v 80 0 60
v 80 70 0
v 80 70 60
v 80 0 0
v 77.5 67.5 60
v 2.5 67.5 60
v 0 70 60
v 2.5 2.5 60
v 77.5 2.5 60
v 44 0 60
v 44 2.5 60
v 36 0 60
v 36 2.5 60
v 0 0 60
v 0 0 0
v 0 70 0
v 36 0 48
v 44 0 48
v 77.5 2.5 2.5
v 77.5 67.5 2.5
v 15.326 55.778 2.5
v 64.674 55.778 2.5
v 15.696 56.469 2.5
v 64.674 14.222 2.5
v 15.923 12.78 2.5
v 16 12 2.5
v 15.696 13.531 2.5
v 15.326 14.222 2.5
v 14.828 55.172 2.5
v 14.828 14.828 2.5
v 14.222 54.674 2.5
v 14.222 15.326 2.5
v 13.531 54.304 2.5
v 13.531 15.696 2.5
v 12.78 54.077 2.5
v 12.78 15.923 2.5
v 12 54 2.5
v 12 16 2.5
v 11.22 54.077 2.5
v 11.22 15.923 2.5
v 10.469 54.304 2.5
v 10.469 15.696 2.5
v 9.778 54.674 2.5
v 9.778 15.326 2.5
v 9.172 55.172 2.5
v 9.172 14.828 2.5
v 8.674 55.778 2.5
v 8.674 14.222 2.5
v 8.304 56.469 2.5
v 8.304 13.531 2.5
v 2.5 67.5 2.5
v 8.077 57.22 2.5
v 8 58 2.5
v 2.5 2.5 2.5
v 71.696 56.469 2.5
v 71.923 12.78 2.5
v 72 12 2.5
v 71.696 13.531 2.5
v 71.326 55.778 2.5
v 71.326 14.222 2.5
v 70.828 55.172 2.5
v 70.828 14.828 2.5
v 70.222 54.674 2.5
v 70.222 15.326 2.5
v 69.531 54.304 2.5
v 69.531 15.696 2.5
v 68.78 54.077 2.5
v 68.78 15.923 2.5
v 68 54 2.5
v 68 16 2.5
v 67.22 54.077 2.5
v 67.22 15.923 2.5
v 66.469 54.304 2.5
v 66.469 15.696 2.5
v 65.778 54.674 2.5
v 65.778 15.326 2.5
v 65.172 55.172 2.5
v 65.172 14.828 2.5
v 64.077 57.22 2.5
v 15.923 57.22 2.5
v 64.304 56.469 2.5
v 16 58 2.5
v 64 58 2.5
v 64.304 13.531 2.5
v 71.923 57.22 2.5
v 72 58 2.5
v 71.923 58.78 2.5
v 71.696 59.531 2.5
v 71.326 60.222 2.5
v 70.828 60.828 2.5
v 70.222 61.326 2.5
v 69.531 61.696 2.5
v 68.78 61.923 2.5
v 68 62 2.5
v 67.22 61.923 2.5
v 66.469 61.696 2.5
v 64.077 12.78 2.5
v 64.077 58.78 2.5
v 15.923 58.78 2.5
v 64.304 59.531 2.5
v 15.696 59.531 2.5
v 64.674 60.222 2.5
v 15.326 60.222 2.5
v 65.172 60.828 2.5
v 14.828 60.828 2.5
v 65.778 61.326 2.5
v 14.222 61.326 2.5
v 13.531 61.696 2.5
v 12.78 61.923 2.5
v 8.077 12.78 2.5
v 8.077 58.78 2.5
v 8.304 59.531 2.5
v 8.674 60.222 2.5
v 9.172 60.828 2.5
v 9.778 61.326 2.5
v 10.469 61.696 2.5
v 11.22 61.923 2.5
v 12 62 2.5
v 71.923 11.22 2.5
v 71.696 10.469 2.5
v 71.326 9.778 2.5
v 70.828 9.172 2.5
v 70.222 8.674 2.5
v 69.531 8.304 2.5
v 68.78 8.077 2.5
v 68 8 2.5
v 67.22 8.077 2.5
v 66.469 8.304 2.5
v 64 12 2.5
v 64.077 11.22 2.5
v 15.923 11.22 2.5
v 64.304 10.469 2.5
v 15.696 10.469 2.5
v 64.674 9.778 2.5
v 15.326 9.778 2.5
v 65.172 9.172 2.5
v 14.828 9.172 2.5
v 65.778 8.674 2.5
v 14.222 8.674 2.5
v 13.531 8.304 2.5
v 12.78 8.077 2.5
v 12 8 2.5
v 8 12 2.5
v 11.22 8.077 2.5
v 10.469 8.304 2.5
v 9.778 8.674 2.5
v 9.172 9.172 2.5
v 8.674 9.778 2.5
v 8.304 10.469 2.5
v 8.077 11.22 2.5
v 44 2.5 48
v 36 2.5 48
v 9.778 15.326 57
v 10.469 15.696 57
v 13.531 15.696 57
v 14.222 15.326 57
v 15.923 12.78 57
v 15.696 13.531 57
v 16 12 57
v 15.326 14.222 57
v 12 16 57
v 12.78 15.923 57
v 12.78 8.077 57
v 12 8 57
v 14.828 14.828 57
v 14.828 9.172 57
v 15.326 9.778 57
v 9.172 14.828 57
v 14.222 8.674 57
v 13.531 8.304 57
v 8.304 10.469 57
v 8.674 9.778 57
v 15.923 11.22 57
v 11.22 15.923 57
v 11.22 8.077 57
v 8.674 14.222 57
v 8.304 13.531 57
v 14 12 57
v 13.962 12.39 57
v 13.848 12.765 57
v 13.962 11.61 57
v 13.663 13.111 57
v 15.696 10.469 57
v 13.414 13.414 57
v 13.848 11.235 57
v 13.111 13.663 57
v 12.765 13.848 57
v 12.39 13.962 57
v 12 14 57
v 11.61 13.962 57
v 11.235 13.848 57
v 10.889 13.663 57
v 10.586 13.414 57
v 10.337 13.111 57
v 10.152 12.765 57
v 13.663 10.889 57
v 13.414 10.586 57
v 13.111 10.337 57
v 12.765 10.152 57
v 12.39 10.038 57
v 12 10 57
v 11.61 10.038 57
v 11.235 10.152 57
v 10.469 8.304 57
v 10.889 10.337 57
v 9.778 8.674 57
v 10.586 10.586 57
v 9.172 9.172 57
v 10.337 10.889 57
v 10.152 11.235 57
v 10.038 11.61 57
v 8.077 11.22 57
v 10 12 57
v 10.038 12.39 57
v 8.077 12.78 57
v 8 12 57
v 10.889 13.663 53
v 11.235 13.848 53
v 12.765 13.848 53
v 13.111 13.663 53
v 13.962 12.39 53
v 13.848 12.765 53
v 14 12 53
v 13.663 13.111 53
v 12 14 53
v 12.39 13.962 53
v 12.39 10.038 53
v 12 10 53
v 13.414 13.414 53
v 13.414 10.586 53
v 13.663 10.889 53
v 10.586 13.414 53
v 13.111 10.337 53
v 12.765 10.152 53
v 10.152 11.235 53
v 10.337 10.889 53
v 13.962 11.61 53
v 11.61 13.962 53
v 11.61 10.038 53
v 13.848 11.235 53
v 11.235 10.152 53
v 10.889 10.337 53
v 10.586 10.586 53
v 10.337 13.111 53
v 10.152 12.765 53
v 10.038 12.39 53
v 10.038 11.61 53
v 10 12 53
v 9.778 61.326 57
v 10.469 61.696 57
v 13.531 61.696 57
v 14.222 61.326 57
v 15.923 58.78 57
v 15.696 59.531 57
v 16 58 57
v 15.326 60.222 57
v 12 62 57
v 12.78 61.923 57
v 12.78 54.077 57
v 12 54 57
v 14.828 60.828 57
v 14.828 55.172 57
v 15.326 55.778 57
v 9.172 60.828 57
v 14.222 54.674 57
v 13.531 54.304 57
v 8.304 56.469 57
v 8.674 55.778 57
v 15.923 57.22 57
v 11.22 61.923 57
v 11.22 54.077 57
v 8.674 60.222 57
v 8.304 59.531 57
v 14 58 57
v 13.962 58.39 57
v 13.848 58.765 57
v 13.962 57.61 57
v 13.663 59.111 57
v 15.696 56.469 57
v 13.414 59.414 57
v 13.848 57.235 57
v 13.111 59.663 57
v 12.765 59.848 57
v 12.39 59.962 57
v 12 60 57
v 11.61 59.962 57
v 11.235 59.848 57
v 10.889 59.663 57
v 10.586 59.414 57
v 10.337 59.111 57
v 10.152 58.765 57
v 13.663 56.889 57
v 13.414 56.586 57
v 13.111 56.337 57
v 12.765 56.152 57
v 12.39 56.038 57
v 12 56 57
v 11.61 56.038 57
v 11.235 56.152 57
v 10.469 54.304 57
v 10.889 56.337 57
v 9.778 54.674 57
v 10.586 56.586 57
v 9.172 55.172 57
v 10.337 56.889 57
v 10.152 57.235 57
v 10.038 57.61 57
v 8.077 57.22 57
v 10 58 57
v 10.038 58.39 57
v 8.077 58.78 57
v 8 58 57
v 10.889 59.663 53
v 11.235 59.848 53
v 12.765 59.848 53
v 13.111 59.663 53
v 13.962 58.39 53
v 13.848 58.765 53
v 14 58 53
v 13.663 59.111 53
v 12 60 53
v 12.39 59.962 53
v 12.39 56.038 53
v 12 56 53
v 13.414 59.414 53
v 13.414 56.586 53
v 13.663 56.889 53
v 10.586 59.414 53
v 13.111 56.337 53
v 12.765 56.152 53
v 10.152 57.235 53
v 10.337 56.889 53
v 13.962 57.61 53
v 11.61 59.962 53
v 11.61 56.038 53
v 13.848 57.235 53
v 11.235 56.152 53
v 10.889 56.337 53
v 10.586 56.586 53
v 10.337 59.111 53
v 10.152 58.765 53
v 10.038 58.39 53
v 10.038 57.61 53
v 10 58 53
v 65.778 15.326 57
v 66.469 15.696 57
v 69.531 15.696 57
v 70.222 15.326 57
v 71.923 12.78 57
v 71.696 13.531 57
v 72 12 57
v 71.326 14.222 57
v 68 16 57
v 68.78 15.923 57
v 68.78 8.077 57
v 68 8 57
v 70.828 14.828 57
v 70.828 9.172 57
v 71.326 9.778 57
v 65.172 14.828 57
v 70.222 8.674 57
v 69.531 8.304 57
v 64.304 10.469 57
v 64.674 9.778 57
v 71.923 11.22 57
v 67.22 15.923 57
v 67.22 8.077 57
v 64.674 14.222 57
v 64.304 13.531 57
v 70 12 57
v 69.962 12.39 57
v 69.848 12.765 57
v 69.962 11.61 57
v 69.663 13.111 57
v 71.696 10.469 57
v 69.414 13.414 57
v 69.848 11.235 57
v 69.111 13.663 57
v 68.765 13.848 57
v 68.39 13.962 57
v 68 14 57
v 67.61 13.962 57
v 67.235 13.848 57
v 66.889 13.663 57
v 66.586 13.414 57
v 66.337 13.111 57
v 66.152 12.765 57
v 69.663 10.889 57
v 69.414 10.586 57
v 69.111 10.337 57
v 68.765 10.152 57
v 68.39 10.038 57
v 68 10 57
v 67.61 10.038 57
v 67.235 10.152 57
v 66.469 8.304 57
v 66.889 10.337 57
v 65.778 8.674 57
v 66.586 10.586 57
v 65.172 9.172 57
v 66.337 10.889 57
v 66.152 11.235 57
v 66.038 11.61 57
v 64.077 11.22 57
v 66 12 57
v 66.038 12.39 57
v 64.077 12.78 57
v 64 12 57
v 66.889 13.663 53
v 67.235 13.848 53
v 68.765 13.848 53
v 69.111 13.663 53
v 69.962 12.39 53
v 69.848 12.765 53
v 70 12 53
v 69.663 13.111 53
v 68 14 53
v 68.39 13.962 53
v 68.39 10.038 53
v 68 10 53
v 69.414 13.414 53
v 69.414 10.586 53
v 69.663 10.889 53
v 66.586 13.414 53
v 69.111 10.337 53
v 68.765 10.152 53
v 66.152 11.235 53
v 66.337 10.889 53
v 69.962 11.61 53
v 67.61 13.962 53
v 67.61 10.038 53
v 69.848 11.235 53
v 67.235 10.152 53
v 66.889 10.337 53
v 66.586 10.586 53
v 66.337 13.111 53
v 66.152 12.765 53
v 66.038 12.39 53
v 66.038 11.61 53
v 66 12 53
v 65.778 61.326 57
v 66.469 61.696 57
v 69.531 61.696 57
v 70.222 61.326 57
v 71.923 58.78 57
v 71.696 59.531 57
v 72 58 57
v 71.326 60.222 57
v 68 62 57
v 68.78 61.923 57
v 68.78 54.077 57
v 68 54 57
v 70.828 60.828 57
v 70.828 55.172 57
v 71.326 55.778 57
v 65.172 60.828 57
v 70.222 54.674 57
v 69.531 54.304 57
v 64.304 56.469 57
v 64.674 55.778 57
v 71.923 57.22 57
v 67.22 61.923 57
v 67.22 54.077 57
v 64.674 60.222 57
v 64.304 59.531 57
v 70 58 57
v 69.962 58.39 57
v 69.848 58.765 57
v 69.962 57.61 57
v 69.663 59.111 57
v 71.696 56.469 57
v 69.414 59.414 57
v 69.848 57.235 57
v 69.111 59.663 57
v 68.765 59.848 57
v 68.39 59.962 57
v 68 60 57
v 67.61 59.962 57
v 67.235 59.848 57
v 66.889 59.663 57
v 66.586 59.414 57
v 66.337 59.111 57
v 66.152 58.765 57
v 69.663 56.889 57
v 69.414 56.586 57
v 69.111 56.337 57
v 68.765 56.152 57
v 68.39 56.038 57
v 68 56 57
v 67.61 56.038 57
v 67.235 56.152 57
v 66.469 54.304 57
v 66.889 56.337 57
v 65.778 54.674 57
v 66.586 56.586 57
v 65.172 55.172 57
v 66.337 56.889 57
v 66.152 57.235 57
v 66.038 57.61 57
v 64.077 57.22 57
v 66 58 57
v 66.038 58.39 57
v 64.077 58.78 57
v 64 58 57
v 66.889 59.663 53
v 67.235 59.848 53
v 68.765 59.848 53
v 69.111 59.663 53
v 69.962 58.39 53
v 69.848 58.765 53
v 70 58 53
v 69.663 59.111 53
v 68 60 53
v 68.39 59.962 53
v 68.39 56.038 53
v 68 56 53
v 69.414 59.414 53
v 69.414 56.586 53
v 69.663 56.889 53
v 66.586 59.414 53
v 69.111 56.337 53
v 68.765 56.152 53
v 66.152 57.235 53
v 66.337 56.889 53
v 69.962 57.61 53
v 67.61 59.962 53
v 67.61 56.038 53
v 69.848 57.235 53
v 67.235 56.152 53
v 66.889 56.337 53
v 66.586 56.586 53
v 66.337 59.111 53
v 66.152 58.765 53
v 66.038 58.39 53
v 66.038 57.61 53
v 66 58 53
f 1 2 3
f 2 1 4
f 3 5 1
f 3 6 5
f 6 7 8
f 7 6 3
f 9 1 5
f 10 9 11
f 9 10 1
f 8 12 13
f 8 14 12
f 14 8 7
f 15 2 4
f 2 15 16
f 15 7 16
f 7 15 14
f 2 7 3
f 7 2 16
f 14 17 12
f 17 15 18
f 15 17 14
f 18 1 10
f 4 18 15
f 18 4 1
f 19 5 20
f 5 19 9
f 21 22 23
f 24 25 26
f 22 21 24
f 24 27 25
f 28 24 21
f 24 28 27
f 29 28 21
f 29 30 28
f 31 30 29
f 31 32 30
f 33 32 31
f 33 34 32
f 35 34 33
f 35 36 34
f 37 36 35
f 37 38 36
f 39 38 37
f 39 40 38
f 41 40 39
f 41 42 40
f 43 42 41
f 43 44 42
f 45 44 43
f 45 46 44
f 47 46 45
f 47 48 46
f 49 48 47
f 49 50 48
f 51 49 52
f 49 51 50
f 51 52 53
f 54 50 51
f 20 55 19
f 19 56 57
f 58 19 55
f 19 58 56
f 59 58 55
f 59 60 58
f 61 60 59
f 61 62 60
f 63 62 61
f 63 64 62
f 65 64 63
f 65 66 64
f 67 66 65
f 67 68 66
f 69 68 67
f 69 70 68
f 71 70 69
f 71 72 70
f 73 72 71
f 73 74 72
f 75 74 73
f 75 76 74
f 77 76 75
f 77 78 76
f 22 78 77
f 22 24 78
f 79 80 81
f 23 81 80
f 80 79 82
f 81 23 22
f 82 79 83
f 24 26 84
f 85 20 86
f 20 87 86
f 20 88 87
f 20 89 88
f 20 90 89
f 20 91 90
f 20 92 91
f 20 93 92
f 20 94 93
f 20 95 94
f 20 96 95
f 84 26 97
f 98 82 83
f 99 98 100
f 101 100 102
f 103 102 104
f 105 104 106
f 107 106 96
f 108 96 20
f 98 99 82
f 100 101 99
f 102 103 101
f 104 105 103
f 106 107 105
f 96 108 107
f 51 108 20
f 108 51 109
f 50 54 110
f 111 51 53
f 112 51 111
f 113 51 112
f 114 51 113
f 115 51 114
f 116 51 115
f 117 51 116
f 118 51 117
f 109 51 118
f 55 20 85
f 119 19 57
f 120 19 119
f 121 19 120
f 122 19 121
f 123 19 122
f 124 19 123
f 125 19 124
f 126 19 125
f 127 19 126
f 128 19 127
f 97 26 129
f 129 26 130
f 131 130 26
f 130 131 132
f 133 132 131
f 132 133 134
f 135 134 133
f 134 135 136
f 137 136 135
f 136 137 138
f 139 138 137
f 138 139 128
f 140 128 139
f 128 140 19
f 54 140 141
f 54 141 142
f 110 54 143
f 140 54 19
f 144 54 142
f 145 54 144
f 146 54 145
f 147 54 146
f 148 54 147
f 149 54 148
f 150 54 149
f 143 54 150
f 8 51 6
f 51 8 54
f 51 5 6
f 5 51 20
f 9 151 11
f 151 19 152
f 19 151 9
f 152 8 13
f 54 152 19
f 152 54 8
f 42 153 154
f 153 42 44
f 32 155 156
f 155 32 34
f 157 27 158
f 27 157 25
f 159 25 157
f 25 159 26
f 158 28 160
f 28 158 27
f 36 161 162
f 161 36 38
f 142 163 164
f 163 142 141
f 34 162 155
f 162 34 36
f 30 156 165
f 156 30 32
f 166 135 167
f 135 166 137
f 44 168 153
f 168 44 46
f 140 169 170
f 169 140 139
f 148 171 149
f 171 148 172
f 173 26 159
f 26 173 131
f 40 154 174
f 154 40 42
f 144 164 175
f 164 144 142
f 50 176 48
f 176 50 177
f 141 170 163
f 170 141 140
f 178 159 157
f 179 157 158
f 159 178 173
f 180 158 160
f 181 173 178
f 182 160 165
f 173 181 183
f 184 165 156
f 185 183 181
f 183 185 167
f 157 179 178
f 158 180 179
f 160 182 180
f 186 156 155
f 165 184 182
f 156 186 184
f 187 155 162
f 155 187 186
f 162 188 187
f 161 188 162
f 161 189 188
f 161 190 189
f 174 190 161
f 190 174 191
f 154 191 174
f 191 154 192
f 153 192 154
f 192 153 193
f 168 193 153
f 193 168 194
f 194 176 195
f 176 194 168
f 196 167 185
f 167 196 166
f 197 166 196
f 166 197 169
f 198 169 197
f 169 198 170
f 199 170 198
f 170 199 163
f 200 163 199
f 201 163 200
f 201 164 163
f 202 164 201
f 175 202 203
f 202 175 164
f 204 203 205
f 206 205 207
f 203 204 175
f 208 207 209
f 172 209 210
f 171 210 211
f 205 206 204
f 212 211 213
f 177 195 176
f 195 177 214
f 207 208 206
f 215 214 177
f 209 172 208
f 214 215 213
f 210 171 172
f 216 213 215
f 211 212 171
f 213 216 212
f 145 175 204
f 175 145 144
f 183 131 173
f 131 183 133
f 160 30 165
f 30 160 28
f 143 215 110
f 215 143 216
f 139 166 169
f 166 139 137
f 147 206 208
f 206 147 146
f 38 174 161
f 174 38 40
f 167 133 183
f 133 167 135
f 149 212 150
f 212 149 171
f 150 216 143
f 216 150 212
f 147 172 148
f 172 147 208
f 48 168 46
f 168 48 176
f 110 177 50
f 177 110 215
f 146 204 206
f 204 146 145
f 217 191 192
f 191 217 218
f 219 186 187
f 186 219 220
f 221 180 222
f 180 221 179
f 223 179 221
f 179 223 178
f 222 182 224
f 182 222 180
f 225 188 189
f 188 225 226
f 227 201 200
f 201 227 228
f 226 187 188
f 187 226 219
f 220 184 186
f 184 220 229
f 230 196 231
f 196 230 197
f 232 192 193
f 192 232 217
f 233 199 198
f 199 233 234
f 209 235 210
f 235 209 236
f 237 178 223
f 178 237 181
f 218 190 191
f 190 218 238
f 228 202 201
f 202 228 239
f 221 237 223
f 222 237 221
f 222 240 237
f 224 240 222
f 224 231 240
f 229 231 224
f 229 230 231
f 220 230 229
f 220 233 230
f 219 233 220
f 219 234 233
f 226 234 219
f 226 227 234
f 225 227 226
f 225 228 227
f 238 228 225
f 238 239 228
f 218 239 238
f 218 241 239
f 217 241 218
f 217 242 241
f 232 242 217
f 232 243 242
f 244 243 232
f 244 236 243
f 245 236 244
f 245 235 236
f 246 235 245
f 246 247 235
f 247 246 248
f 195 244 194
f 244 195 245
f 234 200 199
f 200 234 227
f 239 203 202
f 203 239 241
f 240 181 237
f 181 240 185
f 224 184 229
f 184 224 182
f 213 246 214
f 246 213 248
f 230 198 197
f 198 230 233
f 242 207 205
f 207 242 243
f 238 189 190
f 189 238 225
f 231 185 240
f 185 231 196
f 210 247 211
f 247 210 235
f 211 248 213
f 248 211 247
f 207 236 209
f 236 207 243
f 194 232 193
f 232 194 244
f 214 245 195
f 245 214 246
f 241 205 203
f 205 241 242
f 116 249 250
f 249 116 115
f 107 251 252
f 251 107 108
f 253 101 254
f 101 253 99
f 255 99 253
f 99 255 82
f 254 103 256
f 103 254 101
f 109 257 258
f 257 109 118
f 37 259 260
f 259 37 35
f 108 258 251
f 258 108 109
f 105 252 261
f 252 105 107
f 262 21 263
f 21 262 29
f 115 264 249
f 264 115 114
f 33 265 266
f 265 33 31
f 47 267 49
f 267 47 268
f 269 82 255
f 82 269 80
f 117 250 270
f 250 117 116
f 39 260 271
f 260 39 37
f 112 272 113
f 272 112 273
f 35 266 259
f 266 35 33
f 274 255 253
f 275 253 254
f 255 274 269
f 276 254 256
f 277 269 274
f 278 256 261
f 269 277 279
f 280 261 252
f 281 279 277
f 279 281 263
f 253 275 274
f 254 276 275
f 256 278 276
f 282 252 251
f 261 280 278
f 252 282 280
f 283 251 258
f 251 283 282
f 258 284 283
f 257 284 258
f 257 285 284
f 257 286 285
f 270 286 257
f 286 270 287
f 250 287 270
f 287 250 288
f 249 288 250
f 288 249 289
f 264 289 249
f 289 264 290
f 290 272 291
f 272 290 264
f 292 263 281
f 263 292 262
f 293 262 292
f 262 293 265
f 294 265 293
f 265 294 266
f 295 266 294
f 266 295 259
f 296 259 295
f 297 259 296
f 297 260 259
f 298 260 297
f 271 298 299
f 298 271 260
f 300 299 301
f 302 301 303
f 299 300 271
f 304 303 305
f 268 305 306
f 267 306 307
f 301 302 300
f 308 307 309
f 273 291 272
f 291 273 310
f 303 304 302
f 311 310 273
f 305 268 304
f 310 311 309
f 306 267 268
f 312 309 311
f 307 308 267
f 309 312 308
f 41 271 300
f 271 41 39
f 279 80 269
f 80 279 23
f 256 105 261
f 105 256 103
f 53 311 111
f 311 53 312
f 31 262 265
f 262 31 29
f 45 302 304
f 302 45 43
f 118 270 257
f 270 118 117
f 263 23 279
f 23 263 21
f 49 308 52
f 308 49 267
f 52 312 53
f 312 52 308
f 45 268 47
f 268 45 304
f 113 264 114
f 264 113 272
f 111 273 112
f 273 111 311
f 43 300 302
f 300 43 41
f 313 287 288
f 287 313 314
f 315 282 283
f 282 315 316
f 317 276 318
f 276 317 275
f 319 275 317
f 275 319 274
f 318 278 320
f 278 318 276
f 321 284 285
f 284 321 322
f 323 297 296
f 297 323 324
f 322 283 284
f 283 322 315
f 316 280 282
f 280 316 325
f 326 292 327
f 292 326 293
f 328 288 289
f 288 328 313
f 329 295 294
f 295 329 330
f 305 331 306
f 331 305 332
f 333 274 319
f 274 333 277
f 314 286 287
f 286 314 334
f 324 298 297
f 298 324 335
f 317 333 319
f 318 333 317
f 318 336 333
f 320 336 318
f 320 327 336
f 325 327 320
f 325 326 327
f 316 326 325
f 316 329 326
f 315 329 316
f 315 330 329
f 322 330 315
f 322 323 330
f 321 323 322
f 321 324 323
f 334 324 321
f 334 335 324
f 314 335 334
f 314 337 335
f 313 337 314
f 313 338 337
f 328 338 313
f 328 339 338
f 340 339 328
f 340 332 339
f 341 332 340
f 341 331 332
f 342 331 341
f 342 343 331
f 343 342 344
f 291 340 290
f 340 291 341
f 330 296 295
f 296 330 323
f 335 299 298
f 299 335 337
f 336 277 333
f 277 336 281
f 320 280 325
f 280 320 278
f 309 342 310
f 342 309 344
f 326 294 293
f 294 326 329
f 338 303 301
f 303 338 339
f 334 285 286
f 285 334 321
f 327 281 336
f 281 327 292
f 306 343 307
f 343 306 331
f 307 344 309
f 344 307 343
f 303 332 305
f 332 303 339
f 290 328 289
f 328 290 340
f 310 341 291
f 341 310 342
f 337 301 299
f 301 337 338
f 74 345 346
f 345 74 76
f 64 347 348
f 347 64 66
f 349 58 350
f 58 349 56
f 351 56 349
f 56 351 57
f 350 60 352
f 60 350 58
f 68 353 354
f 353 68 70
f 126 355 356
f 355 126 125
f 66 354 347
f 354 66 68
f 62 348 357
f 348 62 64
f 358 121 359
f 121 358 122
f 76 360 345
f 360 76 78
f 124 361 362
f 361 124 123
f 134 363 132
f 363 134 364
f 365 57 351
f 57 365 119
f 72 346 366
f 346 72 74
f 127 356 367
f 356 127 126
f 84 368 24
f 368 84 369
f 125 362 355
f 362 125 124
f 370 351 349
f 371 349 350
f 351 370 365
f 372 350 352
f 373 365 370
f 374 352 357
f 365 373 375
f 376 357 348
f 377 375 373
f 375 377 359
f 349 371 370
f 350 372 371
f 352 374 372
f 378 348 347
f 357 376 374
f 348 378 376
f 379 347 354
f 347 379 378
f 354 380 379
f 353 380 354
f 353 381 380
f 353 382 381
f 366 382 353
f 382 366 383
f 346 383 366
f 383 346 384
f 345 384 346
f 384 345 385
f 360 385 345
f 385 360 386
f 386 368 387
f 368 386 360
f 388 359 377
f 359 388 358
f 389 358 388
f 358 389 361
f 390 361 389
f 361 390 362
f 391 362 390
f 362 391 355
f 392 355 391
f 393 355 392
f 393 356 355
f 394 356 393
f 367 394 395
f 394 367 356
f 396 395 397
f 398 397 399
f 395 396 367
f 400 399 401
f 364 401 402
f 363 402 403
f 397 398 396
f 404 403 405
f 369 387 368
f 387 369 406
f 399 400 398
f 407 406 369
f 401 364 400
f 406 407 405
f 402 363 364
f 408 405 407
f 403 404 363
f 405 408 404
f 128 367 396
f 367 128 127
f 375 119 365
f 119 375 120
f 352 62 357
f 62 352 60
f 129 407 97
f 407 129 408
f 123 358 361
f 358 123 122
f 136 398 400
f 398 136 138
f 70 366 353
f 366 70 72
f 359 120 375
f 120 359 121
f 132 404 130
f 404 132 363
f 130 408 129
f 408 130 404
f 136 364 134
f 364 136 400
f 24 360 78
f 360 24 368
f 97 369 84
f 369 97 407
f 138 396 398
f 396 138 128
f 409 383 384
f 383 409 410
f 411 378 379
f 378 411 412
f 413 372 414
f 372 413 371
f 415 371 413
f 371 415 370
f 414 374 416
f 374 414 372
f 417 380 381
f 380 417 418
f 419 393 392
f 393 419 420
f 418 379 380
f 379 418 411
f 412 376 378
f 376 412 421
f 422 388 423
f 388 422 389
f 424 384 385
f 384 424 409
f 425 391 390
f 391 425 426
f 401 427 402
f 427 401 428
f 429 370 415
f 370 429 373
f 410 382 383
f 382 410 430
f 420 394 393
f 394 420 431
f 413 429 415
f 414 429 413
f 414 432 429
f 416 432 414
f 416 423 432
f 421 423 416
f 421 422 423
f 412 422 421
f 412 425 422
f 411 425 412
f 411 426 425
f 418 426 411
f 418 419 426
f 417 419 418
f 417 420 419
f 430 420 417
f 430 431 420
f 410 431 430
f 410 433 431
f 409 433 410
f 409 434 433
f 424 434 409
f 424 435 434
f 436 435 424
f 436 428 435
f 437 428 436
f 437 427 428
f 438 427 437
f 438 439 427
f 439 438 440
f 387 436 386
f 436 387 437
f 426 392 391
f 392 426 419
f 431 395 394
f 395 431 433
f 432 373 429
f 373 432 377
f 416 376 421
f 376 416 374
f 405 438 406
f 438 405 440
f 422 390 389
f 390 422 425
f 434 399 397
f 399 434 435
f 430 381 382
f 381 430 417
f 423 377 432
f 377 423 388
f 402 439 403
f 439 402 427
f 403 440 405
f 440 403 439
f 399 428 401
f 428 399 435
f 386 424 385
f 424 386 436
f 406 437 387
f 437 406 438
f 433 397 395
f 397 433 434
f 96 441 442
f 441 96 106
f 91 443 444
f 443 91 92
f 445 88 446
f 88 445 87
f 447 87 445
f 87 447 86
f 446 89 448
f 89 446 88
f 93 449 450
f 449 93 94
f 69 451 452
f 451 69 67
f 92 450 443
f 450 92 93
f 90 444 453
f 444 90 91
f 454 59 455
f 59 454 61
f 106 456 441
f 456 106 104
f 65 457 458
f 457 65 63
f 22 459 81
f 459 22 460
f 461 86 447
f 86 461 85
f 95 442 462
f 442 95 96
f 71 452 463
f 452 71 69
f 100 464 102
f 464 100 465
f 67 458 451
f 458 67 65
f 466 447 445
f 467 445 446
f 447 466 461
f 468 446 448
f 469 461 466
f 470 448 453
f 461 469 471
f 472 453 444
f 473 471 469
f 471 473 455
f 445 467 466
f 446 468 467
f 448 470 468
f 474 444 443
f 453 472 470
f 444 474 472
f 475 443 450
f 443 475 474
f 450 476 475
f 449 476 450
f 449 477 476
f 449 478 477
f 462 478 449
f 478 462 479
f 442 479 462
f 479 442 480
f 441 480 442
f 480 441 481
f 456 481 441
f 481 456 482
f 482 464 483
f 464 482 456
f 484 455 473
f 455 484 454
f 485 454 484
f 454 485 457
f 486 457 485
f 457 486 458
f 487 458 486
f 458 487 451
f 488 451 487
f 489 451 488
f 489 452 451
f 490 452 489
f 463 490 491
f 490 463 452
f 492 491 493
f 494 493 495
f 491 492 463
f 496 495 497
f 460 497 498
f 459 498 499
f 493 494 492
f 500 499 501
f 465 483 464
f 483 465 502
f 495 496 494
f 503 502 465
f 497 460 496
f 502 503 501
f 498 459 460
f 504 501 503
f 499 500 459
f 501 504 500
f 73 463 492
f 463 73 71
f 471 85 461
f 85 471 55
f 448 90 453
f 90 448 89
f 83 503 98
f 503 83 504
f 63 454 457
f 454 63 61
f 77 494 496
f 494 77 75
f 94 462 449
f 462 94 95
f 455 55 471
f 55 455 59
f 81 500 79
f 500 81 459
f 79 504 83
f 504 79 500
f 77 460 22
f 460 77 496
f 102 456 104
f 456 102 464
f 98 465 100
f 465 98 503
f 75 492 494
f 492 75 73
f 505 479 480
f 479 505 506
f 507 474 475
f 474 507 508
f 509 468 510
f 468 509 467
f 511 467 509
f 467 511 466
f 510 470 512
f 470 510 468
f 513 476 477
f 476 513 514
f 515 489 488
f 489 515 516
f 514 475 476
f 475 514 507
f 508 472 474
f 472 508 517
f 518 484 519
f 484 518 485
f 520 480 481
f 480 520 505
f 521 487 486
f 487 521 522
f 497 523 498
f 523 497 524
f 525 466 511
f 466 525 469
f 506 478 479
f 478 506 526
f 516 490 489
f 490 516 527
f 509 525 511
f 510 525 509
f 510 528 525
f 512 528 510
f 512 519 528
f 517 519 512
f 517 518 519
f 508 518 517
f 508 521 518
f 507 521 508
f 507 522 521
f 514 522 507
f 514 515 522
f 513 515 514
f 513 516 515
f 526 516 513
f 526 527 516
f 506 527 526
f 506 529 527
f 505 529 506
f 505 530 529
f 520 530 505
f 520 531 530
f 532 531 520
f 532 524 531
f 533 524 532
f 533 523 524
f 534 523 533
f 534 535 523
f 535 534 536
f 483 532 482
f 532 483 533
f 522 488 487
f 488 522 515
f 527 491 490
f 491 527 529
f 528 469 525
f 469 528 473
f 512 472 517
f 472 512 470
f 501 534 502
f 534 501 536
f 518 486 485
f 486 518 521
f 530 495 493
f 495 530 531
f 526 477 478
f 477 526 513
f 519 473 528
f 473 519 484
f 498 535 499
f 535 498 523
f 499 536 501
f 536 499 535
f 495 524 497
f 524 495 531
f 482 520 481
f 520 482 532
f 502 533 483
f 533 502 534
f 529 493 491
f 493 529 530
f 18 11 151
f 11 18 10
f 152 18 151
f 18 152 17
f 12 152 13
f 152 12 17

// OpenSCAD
$fn = 32;

// ----------------------------------------------------------------------
// Enclosure box: both enclosure
// ----------------------------------------------------------------------

// --- parameters (mm) ---
box_l = 80;               // outer length, X
box_w = 70;               // outer width, Y
box_h = 60;               // outer height
wall_t = 2.5;             // wall thickness
boss_r = 4;               // corner boss radius
hole_r = 2;               // boss screw hole radius
boss_in = 12;             // boss inset from the corners
notch_w = 8;              // cable notch width
notch_h = 12;             // cable notch height
fit_tol = 0.05;           // tolerance for press fits, mm
free_tol = 0.2;           // tolerance for clearance fits, mm

inner_h = box_h - wall_t;  // cavity depth
boss_h = inner_h - 2;  // corner boss height

difference() {
  union() {
    difference() {
      cube([box_l, box_w, box_h]);
      translate([wall_t, wall_t, wall_t])
        cube([box_l - 2 * wall_t, box_w - 2 * wall_t, box_h]);
    }
    for (sx = [0, 1], sy = [0, 1])
      translate([sx ? box_l - boss_in : boss_in,
                 sy ? box_w - boss_in : boss_in, wall_t - 1])
        difference() {
          cylinder(r = boss_r, h = boss_h);
          translate([0, 0, boss_h - 4])
            cylinder(r = hole_r, h = 5);
        }
  }
  translate([box_l / 2 - notch_w / 2, -1, box_h - notch_h])
    cube([notch_w, wall_t + 2, notch_h + 1]);
}
